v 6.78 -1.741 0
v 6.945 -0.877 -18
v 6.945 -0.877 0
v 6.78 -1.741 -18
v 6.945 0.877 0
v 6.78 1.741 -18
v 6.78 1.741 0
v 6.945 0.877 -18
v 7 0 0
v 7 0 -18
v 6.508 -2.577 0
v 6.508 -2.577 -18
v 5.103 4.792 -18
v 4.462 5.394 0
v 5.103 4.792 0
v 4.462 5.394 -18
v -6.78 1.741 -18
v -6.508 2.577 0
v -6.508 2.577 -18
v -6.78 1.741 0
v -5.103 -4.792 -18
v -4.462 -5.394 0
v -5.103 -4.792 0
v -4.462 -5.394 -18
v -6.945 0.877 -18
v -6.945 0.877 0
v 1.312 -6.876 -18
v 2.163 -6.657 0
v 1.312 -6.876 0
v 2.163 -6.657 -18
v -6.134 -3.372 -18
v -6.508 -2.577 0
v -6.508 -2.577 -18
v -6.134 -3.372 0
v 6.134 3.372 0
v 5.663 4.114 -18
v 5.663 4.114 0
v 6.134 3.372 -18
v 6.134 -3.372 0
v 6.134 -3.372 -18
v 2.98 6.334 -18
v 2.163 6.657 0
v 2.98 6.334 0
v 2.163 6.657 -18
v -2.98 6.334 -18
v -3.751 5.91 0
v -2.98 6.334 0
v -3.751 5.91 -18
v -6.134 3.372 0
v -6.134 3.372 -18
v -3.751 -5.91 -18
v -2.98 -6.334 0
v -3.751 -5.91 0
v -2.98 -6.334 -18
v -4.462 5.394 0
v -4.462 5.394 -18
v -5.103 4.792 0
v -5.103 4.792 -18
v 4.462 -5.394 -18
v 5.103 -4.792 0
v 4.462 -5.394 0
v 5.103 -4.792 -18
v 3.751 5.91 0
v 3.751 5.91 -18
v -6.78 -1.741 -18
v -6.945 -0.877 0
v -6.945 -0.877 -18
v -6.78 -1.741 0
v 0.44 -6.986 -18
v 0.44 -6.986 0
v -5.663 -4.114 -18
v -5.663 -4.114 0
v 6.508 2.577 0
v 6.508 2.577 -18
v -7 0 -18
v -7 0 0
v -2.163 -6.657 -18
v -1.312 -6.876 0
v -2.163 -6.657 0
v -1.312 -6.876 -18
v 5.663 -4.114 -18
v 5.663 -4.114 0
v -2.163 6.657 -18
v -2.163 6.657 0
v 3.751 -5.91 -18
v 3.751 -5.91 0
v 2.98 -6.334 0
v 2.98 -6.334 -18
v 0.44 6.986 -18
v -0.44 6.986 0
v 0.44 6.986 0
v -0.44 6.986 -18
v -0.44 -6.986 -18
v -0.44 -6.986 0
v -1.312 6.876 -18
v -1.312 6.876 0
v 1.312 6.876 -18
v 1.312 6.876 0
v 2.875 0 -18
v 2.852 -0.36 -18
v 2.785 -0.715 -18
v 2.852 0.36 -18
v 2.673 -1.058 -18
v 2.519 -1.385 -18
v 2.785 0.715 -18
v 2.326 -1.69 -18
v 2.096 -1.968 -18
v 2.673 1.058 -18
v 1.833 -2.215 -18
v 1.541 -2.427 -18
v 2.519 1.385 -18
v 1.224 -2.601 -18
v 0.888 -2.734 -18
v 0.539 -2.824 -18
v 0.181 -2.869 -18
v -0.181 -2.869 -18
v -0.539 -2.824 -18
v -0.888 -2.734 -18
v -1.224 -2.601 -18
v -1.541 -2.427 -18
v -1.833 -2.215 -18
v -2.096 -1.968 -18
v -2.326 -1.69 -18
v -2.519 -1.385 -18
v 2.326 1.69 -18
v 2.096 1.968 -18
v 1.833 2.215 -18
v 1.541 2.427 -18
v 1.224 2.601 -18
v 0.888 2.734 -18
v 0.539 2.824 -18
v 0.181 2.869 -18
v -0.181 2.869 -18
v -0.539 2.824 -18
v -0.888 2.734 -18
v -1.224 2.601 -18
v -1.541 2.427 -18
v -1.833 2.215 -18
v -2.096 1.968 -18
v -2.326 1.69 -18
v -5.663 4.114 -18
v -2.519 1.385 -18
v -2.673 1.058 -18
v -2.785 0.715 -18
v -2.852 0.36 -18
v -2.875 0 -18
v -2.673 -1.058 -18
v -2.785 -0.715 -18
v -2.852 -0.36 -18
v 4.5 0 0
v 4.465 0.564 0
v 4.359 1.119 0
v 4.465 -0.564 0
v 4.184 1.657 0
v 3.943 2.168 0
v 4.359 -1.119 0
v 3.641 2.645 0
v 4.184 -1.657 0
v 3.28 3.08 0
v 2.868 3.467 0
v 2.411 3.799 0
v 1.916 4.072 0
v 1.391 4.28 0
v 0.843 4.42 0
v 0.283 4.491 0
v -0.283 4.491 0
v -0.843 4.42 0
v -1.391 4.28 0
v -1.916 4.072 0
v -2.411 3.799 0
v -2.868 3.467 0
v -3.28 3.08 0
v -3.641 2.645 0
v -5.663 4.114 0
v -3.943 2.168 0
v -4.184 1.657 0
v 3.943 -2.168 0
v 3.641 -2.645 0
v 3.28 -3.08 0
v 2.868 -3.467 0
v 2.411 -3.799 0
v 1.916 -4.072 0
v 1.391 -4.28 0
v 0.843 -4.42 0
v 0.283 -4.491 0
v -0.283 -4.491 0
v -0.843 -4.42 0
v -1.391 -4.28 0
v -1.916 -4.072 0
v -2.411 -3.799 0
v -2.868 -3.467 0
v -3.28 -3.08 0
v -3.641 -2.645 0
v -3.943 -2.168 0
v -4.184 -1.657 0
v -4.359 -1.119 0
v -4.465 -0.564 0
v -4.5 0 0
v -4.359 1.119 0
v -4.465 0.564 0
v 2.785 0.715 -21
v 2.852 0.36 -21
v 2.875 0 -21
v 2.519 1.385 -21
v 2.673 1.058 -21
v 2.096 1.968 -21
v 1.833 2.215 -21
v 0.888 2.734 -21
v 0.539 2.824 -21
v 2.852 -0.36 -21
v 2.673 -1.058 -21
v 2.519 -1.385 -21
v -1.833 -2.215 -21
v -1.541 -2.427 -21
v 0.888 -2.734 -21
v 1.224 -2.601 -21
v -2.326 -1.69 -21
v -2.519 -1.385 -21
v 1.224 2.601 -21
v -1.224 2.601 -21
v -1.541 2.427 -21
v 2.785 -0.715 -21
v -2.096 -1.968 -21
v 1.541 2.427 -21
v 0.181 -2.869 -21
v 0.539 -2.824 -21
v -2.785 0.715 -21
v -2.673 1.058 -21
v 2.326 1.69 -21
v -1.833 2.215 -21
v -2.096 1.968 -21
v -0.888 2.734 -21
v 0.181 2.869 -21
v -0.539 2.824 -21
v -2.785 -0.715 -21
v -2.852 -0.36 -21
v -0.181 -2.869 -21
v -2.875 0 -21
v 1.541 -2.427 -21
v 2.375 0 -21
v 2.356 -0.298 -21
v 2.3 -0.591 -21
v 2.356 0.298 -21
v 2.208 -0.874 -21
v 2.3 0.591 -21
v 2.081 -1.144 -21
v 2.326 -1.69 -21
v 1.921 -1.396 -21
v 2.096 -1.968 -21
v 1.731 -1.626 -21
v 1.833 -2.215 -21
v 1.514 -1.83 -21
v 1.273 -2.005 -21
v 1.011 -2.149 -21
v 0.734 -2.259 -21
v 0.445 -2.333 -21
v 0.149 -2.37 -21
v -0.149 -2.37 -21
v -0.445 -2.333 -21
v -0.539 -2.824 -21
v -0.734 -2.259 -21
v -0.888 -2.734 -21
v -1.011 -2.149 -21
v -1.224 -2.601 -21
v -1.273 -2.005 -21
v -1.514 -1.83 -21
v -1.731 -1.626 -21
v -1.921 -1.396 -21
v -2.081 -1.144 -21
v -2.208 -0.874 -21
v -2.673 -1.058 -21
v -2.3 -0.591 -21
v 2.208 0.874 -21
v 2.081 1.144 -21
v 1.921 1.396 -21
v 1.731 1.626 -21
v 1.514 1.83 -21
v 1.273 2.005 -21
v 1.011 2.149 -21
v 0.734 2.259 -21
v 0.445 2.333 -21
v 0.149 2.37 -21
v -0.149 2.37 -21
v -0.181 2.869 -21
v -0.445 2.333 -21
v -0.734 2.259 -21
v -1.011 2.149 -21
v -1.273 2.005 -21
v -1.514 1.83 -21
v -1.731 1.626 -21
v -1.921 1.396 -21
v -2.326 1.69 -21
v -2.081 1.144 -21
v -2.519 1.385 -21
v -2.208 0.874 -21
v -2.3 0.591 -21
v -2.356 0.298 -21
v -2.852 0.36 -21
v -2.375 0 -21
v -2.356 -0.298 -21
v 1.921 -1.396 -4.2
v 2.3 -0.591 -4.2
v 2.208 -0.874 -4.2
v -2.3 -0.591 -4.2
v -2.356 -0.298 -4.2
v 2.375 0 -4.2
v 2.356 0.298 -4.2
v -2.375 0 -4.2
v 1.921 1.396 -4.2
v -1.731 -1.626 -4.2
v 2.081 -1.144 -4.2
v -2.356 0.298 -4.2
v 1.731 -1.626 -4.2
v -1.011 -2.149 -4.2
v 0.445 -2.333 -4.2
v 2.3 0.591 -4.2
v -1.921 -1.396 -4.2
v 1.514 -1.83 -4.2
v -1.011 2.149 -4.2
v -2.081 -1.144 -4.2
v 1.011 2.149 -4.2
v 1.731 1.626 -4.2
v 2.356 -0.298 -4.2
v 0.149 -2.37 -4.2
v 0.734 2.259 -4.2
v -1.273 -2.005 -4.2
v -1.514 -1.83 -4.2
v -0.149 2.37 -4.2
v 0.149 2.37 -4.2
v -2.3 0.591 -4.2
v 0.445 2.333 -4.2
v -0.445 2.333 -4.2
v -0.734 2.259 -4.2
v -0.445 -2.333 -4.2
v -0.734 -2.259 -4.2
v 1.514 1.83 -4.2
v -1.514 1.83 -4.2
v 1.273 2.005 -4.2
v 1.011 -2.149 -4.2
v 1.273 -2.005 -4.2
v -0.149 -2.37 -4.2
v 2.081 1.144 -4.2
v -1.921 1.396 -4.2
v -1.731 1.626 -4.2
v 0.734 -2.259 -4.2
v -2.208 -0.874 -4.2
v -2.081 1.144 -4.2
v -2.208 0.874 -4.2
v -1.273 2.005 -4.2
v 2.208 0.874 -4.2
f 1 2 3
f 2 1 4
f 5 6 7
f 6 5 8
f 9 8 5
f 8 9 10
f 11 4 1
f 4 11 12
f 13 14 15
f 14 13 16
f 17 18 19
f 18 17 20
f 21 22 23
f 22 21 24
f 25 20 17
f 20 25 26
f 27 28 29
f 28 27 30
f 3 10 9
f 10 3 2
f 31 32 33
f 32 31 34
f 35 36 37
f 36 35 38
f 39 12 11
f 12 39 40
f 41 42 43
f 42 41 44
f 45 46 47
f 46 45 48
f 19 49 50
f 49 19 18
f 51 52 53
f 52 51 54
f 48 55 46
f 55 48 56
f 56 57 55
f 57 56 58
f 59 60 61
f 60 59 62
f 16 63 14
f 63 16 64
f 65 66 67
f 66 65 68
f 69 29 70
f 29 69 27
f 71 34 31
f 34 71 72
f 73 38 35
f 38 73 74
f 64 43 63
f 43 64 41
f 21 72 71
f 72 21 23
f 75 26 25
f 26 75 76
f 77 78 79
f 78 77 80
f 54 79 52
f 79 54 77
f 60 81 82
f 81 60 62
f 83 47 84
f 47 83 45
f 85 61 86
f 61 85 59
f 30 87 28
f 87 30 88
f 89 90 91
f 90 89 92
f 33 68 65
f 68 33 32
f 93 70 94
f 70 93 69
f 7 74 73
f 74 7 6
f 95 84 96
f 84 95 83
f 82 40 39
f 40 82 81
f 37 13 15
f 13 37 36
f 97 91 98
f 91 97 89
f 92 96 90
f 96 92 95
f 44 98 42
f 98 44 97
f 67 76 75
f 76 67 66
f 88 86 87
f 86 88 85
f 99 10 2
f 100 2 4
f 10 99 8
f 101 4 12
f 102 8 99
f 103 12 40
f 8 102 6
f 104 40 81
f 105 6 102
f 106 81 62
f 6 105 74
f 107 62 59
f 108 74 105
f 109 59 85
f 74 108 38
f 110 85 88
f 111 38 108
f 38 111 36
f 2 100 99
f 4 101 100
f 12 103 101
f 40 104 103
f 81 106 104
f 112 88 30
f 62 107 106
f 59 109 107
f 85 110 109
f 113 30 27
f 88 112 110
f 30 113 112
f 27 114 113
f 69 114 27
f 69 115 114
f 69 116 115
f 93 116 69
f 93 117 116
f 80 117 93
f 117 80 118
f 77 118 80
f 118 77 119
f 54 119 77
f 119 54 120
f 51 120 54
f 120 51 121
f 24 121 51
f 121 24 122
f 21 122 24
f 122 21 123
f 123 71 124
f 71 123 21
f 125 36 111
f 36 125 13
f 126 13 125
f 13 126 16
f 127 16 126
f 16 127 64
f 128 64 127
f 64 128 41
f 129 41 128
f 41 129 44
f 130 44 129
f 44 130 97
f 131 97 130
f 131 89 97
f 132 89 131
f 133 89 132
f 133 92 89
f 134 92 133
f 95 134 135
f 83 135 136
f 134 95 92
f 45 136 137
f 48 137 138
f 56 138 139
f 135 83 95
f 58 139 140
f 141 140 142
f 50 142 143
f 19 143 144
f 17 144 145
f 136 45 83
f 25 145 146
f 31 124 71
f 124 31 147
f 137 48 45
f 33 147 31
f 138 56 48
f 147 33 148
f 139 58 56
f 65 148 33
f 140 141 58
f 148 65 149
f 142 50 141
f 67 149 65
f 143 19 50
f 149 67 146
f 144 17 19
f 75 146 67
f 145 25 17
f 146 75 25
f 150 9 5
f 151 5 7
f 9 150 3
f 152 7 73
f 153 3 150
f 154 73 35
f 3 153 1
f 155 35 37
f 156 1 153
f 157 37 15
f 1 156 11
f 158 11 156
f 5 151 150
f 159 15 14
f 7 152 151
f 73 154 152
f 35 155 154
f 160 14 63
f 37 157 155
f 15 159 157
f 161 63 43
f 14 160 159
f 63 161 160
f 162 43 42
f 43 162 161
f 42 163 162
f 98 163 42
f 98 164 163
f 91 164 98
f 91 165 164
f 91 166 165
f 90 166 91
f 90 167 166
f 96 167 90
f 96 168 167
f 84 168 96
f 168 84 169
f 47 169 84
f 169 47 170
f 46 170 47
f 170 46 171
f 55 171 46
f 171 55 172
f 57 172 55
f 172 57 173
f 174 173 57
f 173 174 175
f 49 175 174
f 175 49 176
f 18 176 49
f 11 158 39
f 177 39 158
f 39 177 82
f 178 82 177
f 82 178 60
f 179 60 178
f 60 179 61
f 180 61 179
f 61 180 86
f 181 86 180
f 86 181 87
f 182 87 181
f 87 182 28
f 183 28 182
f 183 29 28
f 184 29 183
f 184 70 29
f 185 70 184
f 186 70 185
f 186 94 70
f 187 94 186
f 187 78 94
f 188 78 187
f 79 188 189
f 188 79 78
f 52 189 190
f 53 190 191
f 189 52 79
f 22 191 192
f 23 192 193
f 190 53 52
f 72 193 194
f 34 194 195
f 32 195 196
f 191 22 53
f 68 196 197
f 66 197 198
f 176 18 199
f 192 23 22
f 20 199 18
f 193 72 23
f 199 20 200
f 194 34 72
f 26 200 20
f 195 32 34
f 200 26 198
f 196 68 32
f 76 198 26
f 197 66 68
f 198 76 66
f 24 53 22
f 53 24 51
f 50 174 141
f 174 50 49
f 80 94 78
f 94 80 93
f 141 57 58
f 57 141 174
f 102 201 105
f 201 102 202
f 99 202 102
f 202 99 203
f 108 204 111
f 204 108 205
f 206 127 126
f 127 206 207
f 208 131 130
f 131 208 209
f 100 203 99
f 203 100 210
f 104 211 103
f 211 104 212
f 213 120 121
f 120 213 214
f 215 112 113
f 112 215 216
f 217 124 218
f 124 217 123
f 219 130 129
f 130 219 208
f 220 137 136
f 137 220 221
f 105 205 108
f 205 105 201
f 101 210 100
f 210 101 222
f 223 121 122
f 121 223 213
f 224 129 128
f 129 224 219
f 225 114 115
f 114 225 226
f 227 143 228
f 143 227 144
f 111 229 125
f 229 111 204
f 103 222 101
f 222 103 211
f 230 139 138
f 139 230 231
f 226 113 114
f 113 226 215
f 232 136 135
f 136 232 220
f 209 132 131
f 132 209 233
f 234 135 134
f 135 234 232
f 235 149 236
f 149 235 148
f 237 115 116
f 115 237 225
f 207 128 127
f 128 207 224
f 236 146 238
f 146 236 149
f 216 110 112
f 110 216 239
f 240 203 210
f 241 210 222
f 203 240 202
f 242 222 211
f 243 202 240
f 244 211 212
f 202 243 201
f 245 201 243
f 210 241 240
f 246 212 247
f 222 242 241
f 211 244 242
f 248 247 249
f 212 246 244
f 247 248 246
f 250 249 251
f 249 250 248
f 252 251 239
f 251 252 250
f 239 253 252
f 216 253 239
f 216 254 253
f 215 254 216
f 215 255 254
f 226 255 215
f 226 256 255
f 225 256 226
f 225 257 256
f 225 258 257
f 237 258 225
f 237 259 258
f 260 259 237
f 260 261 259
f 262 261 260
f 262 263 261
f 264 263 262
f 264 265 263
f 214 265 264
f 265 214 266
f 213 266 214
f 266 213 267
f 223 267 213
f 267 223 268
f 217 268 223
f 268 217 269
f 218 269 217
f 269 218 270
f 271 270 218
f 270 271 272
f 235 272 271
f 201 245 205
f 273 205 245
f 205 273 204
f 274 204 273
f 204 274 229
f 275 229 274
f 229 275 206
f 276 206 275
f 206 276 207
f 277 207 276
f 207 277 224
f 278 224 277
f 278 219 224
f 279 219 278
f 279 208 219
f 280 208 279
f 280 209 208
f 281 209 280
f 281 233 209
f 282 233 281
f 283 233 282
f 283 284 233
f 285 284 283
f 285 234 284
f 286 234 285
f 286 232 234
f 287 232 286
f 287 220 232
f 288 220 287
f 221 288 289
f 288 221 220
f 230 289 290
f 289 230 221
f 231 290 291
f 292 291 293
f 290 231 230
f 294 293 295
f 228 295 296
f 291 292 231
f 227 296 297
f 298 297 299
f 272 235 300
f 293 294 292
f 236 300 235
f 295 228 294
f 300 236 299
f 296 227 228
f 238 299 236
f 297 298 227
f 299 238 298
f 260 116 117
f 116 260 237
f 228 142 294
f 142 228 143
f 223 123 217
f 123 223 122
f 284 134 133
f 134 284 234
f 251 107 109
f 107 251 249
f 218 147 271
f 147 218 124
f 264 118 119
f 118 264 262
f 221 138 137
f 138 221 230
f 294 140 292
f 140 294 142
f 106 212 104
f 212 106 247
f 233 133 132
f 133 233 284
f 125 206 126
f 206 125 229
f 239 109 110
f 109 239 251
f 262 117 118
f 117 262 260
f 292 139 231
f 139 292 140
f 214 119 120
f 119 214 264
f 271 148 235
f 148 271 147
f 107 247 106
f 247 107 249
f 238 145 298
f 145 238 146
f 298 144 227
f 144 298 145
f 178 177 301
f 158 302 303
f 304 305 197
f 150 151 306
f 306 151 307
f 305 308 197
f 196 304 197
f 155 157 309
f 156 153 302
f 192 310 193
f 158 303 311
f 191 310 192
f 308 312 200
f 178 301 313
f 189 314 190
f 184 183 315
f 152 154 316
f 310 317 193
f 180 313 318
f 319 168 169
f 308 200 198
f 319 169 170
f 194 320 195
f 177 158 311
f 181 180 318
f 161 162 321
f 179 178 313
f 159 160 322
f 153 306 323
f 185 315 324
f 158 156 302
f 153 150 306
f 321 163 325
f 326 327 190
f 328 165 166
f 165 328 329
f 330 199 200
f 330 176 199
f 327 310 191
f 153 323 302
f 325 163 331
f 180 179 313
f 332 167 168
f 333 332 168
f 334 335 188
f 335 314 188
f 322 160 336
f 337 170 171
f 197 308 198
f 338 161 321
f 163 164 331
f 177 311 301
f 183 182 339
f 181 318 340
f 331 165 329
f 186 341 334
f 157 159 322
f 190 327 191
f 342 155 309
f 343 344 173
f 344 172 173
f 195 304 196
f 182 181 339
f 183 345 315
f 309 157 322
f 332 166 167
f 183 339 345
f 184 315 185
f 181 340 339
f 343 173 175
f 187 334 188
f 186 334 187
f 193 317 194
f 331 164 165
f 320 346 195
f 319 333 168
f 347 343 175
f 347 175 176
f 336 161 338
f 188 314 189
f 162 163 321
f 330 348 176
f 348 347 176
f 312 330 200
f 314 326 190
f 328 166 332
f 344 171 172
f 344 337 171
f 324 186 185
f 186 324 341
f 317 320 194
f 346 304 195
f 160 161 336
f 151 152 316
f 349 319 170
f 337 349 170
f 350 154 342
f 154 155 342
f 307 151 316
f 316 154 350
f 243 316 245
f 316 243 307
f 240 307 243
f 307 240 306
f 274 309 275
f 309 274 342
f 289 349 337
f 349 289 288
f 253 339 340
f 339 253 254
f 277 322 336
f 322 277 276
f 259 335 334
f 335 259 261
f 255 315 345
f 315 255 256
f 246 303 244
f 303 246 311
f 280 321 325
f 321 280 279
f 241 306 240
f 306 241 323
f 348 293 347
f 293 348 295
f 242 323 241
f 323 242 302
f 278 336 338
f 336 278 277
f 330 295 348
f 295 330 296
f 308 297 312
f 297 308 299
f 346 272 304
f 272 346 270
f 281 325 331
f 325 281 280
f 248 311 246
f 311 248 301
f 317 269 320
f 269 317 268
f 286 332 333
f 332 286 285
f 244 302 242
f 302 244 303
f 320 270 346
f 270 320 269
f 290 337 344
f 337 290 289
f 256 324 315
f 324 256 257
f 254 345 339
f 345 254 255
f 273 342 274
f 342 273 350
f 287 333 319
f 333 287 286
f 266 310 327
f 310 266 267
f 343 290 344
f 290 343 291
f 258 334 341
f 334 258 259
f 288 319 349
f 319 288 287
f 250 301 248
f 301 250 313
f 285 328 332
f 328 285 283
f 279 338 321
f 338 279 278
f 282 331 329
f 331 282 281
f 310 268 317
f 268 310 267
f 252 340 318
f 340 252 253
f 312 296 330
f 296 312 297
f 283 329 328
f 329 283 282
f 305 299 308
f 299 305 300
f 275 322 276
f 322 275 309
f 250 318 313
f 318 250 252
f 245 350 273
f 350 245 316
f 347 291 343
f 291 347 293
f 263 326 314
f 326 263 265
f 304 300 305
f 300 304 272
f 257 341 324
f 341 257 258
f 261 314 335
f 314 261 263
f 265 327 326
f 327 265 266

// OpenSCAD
$fn = 50;


difference() {
	union() {
		translate(v = [0, 0, -18.0000000000]) {
			cylinder(h = 18, r = 7.0000000000);
		}
		#translate(v = [0, 0, -21.0000000000]) {
			cylinder(h = 21, r = 2.8750000000);
		}
	}
	union() {
		translate(v = [0, 0, 0]) {
			rotate(a = [0, 0, 0]) {
				difference() {
					union() {
						translate(v = [0, 0, -21.0000000000]) {
							cylinder(h = 21, r = 2.2500000000);
						}
						translate(v = [0, 0, -4.2000000000]) {
							cylinder(h = 4.2000000000, r1 = 2.3750000000, r2 = 4.5000000000);
						}
						translate(v = [0, 0, -21.0000000000]) {
							cylinder(h = 21, r = 2.3750000000);
						}
						translate(v = [0, 0, -21.0000000000]) {
							cylinder(h = 21, r = 2.2500000000);
						}
					}
					union();
				}
			}
		}
	}
}
